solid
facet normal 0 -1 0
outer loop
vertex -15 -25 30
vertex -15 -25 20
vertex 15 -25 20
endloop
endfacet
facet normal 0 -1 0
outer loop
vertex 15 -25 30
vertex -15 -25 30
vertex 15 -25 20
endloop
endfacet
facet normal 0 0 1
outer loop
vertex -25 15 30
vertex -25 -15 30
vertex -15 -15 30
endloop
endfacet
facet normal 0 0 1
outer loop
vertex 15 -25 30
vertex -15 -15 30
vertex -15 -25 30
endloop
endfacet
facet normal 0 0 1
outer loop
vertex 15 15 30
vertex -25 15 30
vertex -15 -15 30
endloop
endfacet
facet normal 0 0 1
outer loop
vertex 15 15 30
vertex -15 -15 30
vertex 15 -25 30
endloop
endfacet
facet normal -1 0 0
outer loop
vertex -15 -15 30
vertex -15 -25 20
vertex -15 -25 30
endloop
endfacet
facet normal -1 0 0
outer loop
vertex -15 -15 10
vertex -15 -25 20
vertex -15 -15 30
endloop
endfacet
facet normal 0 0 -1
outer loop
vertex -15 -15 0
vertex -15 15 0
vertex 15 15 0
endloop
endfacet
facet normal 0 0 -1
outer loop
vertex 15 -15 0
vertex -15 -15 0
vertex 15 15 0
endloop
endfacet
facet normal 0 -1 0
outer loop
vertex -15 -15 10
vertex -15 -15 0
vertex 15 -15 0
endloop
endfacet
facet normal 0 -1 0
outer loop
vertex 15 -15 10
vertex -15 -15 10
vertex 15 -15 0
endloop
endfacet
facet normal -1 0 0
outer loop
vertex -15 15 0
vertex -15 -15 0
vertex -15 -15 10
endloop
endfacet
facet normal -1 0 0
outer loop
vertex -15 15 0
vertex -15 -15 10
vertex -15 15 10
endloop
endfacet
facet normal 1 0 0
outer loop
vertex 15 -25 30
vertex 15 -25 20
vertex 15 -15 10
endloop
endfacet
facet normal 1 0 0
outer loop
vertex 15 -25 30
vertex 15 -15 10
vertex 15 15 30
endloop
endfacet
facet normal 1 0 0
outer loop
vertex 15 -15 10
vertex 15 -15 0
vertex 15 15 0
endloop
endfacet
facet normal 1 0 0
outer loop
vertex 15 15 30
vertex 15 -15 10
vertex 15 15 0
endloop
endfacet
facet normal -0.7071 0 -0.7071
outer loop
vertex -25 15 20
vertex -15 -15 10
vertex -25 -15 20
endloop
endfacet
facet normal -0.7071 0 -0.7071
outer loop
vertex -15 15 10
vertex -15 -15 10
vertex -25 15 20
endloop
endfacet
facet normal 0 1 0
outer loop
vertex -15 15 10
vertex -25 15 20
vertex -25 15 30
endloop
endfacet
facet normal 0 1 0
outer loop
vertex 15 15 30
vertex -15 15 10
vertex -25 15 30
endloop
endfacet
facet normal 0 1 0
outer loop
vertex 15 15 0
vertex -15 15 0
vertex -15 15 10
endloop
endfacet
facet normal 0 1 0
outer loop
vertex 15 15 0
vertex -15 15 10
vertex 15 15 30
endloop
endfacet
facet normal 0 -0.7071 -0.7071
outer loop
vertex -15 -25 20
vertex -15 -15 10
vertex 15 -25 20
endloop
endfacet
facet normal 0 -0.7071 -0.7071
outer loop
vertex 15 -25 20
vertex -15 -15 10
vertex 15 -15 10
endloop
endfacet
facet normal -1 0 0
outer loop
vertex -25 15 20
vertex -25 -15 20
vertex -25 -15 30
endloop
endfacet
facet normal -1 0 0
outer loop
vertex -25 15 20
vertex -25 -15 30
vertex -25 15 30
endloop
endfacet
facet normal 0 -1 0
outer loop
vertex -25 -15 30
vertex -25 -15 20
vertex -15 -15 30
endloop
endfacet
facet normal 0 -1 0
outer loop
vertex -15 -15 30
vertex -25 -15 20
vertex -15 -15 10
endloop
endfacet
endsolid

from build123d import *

# Parameters (mm, degrees)
BOX002_W        = 30
BOX002_H        = 11
BOX002_DEPTH    = 20
CHAMFER_SIZE    = 10
BOX_W           = 30
BOX_H           = 30
BOX_DEPTH       = 30
BOX001_W        = 11
BOX001_H        = 30
BOX001_DEPTH    = 20
CHAMFER001_SIZE = 10


with BuildPart() as chamfer_body:
    # Box002 → Box002 (new body)
    with BuildSketch(Plane(origin=(-15, -25, 10), x_dir=(1, 0, 0), z_dir=(0, 0, 1))):
        with Locations((15, 5.5)):
            Rectangle(BOX002_W, BOX002_H)
    extrude(amount=BOX002_DEPTH)

    # Chamfer
    chamfer_edges = [chamfer_body.edges().sort_by_distance(p)[0] for p in [
        (0, -25, 10),
    ]]
    chamfer(chamfer_edges, length=CHAMFER_SIZE)


with BuildPart() as cube:
    # Box → Box (new body)
    with BuildSketch(Plane(origin=(-15, -15, 0), x_dir=(1, 0, 0), z_dir=(0, 0, 1))):
        with Locations((15, 15)):
            Rectangle(BOX_W, BOX_H)
    extrude(amount=BOX_DEPTH)


with BuildPart() as fusion:
    # Box001 → Box001 (new body)
    with BuildSketch(Plane(origin=(-25, -15, 10), x_dir=(1, 0, 0), z_dir=(0, 0, 1))):
        with Locations((5.5, 15)):
            Rectangle(BOX001_W, BOX001_H)
    extrude(amount=BOX001_DEPTH)

    # Chamfer001
    chamfer001_edges = [fusion.edges().sort_by_distance(p)[0] for p in [
        (-25, 0, 10),
    ]]
    chamfer(chamfer001_edges, length=CHAMFER001_SIZE)

    # Fusion: union Chamfer body, Cube
    add(chamfer_body.part)
    add(cube.part)


solid = fusion.part
